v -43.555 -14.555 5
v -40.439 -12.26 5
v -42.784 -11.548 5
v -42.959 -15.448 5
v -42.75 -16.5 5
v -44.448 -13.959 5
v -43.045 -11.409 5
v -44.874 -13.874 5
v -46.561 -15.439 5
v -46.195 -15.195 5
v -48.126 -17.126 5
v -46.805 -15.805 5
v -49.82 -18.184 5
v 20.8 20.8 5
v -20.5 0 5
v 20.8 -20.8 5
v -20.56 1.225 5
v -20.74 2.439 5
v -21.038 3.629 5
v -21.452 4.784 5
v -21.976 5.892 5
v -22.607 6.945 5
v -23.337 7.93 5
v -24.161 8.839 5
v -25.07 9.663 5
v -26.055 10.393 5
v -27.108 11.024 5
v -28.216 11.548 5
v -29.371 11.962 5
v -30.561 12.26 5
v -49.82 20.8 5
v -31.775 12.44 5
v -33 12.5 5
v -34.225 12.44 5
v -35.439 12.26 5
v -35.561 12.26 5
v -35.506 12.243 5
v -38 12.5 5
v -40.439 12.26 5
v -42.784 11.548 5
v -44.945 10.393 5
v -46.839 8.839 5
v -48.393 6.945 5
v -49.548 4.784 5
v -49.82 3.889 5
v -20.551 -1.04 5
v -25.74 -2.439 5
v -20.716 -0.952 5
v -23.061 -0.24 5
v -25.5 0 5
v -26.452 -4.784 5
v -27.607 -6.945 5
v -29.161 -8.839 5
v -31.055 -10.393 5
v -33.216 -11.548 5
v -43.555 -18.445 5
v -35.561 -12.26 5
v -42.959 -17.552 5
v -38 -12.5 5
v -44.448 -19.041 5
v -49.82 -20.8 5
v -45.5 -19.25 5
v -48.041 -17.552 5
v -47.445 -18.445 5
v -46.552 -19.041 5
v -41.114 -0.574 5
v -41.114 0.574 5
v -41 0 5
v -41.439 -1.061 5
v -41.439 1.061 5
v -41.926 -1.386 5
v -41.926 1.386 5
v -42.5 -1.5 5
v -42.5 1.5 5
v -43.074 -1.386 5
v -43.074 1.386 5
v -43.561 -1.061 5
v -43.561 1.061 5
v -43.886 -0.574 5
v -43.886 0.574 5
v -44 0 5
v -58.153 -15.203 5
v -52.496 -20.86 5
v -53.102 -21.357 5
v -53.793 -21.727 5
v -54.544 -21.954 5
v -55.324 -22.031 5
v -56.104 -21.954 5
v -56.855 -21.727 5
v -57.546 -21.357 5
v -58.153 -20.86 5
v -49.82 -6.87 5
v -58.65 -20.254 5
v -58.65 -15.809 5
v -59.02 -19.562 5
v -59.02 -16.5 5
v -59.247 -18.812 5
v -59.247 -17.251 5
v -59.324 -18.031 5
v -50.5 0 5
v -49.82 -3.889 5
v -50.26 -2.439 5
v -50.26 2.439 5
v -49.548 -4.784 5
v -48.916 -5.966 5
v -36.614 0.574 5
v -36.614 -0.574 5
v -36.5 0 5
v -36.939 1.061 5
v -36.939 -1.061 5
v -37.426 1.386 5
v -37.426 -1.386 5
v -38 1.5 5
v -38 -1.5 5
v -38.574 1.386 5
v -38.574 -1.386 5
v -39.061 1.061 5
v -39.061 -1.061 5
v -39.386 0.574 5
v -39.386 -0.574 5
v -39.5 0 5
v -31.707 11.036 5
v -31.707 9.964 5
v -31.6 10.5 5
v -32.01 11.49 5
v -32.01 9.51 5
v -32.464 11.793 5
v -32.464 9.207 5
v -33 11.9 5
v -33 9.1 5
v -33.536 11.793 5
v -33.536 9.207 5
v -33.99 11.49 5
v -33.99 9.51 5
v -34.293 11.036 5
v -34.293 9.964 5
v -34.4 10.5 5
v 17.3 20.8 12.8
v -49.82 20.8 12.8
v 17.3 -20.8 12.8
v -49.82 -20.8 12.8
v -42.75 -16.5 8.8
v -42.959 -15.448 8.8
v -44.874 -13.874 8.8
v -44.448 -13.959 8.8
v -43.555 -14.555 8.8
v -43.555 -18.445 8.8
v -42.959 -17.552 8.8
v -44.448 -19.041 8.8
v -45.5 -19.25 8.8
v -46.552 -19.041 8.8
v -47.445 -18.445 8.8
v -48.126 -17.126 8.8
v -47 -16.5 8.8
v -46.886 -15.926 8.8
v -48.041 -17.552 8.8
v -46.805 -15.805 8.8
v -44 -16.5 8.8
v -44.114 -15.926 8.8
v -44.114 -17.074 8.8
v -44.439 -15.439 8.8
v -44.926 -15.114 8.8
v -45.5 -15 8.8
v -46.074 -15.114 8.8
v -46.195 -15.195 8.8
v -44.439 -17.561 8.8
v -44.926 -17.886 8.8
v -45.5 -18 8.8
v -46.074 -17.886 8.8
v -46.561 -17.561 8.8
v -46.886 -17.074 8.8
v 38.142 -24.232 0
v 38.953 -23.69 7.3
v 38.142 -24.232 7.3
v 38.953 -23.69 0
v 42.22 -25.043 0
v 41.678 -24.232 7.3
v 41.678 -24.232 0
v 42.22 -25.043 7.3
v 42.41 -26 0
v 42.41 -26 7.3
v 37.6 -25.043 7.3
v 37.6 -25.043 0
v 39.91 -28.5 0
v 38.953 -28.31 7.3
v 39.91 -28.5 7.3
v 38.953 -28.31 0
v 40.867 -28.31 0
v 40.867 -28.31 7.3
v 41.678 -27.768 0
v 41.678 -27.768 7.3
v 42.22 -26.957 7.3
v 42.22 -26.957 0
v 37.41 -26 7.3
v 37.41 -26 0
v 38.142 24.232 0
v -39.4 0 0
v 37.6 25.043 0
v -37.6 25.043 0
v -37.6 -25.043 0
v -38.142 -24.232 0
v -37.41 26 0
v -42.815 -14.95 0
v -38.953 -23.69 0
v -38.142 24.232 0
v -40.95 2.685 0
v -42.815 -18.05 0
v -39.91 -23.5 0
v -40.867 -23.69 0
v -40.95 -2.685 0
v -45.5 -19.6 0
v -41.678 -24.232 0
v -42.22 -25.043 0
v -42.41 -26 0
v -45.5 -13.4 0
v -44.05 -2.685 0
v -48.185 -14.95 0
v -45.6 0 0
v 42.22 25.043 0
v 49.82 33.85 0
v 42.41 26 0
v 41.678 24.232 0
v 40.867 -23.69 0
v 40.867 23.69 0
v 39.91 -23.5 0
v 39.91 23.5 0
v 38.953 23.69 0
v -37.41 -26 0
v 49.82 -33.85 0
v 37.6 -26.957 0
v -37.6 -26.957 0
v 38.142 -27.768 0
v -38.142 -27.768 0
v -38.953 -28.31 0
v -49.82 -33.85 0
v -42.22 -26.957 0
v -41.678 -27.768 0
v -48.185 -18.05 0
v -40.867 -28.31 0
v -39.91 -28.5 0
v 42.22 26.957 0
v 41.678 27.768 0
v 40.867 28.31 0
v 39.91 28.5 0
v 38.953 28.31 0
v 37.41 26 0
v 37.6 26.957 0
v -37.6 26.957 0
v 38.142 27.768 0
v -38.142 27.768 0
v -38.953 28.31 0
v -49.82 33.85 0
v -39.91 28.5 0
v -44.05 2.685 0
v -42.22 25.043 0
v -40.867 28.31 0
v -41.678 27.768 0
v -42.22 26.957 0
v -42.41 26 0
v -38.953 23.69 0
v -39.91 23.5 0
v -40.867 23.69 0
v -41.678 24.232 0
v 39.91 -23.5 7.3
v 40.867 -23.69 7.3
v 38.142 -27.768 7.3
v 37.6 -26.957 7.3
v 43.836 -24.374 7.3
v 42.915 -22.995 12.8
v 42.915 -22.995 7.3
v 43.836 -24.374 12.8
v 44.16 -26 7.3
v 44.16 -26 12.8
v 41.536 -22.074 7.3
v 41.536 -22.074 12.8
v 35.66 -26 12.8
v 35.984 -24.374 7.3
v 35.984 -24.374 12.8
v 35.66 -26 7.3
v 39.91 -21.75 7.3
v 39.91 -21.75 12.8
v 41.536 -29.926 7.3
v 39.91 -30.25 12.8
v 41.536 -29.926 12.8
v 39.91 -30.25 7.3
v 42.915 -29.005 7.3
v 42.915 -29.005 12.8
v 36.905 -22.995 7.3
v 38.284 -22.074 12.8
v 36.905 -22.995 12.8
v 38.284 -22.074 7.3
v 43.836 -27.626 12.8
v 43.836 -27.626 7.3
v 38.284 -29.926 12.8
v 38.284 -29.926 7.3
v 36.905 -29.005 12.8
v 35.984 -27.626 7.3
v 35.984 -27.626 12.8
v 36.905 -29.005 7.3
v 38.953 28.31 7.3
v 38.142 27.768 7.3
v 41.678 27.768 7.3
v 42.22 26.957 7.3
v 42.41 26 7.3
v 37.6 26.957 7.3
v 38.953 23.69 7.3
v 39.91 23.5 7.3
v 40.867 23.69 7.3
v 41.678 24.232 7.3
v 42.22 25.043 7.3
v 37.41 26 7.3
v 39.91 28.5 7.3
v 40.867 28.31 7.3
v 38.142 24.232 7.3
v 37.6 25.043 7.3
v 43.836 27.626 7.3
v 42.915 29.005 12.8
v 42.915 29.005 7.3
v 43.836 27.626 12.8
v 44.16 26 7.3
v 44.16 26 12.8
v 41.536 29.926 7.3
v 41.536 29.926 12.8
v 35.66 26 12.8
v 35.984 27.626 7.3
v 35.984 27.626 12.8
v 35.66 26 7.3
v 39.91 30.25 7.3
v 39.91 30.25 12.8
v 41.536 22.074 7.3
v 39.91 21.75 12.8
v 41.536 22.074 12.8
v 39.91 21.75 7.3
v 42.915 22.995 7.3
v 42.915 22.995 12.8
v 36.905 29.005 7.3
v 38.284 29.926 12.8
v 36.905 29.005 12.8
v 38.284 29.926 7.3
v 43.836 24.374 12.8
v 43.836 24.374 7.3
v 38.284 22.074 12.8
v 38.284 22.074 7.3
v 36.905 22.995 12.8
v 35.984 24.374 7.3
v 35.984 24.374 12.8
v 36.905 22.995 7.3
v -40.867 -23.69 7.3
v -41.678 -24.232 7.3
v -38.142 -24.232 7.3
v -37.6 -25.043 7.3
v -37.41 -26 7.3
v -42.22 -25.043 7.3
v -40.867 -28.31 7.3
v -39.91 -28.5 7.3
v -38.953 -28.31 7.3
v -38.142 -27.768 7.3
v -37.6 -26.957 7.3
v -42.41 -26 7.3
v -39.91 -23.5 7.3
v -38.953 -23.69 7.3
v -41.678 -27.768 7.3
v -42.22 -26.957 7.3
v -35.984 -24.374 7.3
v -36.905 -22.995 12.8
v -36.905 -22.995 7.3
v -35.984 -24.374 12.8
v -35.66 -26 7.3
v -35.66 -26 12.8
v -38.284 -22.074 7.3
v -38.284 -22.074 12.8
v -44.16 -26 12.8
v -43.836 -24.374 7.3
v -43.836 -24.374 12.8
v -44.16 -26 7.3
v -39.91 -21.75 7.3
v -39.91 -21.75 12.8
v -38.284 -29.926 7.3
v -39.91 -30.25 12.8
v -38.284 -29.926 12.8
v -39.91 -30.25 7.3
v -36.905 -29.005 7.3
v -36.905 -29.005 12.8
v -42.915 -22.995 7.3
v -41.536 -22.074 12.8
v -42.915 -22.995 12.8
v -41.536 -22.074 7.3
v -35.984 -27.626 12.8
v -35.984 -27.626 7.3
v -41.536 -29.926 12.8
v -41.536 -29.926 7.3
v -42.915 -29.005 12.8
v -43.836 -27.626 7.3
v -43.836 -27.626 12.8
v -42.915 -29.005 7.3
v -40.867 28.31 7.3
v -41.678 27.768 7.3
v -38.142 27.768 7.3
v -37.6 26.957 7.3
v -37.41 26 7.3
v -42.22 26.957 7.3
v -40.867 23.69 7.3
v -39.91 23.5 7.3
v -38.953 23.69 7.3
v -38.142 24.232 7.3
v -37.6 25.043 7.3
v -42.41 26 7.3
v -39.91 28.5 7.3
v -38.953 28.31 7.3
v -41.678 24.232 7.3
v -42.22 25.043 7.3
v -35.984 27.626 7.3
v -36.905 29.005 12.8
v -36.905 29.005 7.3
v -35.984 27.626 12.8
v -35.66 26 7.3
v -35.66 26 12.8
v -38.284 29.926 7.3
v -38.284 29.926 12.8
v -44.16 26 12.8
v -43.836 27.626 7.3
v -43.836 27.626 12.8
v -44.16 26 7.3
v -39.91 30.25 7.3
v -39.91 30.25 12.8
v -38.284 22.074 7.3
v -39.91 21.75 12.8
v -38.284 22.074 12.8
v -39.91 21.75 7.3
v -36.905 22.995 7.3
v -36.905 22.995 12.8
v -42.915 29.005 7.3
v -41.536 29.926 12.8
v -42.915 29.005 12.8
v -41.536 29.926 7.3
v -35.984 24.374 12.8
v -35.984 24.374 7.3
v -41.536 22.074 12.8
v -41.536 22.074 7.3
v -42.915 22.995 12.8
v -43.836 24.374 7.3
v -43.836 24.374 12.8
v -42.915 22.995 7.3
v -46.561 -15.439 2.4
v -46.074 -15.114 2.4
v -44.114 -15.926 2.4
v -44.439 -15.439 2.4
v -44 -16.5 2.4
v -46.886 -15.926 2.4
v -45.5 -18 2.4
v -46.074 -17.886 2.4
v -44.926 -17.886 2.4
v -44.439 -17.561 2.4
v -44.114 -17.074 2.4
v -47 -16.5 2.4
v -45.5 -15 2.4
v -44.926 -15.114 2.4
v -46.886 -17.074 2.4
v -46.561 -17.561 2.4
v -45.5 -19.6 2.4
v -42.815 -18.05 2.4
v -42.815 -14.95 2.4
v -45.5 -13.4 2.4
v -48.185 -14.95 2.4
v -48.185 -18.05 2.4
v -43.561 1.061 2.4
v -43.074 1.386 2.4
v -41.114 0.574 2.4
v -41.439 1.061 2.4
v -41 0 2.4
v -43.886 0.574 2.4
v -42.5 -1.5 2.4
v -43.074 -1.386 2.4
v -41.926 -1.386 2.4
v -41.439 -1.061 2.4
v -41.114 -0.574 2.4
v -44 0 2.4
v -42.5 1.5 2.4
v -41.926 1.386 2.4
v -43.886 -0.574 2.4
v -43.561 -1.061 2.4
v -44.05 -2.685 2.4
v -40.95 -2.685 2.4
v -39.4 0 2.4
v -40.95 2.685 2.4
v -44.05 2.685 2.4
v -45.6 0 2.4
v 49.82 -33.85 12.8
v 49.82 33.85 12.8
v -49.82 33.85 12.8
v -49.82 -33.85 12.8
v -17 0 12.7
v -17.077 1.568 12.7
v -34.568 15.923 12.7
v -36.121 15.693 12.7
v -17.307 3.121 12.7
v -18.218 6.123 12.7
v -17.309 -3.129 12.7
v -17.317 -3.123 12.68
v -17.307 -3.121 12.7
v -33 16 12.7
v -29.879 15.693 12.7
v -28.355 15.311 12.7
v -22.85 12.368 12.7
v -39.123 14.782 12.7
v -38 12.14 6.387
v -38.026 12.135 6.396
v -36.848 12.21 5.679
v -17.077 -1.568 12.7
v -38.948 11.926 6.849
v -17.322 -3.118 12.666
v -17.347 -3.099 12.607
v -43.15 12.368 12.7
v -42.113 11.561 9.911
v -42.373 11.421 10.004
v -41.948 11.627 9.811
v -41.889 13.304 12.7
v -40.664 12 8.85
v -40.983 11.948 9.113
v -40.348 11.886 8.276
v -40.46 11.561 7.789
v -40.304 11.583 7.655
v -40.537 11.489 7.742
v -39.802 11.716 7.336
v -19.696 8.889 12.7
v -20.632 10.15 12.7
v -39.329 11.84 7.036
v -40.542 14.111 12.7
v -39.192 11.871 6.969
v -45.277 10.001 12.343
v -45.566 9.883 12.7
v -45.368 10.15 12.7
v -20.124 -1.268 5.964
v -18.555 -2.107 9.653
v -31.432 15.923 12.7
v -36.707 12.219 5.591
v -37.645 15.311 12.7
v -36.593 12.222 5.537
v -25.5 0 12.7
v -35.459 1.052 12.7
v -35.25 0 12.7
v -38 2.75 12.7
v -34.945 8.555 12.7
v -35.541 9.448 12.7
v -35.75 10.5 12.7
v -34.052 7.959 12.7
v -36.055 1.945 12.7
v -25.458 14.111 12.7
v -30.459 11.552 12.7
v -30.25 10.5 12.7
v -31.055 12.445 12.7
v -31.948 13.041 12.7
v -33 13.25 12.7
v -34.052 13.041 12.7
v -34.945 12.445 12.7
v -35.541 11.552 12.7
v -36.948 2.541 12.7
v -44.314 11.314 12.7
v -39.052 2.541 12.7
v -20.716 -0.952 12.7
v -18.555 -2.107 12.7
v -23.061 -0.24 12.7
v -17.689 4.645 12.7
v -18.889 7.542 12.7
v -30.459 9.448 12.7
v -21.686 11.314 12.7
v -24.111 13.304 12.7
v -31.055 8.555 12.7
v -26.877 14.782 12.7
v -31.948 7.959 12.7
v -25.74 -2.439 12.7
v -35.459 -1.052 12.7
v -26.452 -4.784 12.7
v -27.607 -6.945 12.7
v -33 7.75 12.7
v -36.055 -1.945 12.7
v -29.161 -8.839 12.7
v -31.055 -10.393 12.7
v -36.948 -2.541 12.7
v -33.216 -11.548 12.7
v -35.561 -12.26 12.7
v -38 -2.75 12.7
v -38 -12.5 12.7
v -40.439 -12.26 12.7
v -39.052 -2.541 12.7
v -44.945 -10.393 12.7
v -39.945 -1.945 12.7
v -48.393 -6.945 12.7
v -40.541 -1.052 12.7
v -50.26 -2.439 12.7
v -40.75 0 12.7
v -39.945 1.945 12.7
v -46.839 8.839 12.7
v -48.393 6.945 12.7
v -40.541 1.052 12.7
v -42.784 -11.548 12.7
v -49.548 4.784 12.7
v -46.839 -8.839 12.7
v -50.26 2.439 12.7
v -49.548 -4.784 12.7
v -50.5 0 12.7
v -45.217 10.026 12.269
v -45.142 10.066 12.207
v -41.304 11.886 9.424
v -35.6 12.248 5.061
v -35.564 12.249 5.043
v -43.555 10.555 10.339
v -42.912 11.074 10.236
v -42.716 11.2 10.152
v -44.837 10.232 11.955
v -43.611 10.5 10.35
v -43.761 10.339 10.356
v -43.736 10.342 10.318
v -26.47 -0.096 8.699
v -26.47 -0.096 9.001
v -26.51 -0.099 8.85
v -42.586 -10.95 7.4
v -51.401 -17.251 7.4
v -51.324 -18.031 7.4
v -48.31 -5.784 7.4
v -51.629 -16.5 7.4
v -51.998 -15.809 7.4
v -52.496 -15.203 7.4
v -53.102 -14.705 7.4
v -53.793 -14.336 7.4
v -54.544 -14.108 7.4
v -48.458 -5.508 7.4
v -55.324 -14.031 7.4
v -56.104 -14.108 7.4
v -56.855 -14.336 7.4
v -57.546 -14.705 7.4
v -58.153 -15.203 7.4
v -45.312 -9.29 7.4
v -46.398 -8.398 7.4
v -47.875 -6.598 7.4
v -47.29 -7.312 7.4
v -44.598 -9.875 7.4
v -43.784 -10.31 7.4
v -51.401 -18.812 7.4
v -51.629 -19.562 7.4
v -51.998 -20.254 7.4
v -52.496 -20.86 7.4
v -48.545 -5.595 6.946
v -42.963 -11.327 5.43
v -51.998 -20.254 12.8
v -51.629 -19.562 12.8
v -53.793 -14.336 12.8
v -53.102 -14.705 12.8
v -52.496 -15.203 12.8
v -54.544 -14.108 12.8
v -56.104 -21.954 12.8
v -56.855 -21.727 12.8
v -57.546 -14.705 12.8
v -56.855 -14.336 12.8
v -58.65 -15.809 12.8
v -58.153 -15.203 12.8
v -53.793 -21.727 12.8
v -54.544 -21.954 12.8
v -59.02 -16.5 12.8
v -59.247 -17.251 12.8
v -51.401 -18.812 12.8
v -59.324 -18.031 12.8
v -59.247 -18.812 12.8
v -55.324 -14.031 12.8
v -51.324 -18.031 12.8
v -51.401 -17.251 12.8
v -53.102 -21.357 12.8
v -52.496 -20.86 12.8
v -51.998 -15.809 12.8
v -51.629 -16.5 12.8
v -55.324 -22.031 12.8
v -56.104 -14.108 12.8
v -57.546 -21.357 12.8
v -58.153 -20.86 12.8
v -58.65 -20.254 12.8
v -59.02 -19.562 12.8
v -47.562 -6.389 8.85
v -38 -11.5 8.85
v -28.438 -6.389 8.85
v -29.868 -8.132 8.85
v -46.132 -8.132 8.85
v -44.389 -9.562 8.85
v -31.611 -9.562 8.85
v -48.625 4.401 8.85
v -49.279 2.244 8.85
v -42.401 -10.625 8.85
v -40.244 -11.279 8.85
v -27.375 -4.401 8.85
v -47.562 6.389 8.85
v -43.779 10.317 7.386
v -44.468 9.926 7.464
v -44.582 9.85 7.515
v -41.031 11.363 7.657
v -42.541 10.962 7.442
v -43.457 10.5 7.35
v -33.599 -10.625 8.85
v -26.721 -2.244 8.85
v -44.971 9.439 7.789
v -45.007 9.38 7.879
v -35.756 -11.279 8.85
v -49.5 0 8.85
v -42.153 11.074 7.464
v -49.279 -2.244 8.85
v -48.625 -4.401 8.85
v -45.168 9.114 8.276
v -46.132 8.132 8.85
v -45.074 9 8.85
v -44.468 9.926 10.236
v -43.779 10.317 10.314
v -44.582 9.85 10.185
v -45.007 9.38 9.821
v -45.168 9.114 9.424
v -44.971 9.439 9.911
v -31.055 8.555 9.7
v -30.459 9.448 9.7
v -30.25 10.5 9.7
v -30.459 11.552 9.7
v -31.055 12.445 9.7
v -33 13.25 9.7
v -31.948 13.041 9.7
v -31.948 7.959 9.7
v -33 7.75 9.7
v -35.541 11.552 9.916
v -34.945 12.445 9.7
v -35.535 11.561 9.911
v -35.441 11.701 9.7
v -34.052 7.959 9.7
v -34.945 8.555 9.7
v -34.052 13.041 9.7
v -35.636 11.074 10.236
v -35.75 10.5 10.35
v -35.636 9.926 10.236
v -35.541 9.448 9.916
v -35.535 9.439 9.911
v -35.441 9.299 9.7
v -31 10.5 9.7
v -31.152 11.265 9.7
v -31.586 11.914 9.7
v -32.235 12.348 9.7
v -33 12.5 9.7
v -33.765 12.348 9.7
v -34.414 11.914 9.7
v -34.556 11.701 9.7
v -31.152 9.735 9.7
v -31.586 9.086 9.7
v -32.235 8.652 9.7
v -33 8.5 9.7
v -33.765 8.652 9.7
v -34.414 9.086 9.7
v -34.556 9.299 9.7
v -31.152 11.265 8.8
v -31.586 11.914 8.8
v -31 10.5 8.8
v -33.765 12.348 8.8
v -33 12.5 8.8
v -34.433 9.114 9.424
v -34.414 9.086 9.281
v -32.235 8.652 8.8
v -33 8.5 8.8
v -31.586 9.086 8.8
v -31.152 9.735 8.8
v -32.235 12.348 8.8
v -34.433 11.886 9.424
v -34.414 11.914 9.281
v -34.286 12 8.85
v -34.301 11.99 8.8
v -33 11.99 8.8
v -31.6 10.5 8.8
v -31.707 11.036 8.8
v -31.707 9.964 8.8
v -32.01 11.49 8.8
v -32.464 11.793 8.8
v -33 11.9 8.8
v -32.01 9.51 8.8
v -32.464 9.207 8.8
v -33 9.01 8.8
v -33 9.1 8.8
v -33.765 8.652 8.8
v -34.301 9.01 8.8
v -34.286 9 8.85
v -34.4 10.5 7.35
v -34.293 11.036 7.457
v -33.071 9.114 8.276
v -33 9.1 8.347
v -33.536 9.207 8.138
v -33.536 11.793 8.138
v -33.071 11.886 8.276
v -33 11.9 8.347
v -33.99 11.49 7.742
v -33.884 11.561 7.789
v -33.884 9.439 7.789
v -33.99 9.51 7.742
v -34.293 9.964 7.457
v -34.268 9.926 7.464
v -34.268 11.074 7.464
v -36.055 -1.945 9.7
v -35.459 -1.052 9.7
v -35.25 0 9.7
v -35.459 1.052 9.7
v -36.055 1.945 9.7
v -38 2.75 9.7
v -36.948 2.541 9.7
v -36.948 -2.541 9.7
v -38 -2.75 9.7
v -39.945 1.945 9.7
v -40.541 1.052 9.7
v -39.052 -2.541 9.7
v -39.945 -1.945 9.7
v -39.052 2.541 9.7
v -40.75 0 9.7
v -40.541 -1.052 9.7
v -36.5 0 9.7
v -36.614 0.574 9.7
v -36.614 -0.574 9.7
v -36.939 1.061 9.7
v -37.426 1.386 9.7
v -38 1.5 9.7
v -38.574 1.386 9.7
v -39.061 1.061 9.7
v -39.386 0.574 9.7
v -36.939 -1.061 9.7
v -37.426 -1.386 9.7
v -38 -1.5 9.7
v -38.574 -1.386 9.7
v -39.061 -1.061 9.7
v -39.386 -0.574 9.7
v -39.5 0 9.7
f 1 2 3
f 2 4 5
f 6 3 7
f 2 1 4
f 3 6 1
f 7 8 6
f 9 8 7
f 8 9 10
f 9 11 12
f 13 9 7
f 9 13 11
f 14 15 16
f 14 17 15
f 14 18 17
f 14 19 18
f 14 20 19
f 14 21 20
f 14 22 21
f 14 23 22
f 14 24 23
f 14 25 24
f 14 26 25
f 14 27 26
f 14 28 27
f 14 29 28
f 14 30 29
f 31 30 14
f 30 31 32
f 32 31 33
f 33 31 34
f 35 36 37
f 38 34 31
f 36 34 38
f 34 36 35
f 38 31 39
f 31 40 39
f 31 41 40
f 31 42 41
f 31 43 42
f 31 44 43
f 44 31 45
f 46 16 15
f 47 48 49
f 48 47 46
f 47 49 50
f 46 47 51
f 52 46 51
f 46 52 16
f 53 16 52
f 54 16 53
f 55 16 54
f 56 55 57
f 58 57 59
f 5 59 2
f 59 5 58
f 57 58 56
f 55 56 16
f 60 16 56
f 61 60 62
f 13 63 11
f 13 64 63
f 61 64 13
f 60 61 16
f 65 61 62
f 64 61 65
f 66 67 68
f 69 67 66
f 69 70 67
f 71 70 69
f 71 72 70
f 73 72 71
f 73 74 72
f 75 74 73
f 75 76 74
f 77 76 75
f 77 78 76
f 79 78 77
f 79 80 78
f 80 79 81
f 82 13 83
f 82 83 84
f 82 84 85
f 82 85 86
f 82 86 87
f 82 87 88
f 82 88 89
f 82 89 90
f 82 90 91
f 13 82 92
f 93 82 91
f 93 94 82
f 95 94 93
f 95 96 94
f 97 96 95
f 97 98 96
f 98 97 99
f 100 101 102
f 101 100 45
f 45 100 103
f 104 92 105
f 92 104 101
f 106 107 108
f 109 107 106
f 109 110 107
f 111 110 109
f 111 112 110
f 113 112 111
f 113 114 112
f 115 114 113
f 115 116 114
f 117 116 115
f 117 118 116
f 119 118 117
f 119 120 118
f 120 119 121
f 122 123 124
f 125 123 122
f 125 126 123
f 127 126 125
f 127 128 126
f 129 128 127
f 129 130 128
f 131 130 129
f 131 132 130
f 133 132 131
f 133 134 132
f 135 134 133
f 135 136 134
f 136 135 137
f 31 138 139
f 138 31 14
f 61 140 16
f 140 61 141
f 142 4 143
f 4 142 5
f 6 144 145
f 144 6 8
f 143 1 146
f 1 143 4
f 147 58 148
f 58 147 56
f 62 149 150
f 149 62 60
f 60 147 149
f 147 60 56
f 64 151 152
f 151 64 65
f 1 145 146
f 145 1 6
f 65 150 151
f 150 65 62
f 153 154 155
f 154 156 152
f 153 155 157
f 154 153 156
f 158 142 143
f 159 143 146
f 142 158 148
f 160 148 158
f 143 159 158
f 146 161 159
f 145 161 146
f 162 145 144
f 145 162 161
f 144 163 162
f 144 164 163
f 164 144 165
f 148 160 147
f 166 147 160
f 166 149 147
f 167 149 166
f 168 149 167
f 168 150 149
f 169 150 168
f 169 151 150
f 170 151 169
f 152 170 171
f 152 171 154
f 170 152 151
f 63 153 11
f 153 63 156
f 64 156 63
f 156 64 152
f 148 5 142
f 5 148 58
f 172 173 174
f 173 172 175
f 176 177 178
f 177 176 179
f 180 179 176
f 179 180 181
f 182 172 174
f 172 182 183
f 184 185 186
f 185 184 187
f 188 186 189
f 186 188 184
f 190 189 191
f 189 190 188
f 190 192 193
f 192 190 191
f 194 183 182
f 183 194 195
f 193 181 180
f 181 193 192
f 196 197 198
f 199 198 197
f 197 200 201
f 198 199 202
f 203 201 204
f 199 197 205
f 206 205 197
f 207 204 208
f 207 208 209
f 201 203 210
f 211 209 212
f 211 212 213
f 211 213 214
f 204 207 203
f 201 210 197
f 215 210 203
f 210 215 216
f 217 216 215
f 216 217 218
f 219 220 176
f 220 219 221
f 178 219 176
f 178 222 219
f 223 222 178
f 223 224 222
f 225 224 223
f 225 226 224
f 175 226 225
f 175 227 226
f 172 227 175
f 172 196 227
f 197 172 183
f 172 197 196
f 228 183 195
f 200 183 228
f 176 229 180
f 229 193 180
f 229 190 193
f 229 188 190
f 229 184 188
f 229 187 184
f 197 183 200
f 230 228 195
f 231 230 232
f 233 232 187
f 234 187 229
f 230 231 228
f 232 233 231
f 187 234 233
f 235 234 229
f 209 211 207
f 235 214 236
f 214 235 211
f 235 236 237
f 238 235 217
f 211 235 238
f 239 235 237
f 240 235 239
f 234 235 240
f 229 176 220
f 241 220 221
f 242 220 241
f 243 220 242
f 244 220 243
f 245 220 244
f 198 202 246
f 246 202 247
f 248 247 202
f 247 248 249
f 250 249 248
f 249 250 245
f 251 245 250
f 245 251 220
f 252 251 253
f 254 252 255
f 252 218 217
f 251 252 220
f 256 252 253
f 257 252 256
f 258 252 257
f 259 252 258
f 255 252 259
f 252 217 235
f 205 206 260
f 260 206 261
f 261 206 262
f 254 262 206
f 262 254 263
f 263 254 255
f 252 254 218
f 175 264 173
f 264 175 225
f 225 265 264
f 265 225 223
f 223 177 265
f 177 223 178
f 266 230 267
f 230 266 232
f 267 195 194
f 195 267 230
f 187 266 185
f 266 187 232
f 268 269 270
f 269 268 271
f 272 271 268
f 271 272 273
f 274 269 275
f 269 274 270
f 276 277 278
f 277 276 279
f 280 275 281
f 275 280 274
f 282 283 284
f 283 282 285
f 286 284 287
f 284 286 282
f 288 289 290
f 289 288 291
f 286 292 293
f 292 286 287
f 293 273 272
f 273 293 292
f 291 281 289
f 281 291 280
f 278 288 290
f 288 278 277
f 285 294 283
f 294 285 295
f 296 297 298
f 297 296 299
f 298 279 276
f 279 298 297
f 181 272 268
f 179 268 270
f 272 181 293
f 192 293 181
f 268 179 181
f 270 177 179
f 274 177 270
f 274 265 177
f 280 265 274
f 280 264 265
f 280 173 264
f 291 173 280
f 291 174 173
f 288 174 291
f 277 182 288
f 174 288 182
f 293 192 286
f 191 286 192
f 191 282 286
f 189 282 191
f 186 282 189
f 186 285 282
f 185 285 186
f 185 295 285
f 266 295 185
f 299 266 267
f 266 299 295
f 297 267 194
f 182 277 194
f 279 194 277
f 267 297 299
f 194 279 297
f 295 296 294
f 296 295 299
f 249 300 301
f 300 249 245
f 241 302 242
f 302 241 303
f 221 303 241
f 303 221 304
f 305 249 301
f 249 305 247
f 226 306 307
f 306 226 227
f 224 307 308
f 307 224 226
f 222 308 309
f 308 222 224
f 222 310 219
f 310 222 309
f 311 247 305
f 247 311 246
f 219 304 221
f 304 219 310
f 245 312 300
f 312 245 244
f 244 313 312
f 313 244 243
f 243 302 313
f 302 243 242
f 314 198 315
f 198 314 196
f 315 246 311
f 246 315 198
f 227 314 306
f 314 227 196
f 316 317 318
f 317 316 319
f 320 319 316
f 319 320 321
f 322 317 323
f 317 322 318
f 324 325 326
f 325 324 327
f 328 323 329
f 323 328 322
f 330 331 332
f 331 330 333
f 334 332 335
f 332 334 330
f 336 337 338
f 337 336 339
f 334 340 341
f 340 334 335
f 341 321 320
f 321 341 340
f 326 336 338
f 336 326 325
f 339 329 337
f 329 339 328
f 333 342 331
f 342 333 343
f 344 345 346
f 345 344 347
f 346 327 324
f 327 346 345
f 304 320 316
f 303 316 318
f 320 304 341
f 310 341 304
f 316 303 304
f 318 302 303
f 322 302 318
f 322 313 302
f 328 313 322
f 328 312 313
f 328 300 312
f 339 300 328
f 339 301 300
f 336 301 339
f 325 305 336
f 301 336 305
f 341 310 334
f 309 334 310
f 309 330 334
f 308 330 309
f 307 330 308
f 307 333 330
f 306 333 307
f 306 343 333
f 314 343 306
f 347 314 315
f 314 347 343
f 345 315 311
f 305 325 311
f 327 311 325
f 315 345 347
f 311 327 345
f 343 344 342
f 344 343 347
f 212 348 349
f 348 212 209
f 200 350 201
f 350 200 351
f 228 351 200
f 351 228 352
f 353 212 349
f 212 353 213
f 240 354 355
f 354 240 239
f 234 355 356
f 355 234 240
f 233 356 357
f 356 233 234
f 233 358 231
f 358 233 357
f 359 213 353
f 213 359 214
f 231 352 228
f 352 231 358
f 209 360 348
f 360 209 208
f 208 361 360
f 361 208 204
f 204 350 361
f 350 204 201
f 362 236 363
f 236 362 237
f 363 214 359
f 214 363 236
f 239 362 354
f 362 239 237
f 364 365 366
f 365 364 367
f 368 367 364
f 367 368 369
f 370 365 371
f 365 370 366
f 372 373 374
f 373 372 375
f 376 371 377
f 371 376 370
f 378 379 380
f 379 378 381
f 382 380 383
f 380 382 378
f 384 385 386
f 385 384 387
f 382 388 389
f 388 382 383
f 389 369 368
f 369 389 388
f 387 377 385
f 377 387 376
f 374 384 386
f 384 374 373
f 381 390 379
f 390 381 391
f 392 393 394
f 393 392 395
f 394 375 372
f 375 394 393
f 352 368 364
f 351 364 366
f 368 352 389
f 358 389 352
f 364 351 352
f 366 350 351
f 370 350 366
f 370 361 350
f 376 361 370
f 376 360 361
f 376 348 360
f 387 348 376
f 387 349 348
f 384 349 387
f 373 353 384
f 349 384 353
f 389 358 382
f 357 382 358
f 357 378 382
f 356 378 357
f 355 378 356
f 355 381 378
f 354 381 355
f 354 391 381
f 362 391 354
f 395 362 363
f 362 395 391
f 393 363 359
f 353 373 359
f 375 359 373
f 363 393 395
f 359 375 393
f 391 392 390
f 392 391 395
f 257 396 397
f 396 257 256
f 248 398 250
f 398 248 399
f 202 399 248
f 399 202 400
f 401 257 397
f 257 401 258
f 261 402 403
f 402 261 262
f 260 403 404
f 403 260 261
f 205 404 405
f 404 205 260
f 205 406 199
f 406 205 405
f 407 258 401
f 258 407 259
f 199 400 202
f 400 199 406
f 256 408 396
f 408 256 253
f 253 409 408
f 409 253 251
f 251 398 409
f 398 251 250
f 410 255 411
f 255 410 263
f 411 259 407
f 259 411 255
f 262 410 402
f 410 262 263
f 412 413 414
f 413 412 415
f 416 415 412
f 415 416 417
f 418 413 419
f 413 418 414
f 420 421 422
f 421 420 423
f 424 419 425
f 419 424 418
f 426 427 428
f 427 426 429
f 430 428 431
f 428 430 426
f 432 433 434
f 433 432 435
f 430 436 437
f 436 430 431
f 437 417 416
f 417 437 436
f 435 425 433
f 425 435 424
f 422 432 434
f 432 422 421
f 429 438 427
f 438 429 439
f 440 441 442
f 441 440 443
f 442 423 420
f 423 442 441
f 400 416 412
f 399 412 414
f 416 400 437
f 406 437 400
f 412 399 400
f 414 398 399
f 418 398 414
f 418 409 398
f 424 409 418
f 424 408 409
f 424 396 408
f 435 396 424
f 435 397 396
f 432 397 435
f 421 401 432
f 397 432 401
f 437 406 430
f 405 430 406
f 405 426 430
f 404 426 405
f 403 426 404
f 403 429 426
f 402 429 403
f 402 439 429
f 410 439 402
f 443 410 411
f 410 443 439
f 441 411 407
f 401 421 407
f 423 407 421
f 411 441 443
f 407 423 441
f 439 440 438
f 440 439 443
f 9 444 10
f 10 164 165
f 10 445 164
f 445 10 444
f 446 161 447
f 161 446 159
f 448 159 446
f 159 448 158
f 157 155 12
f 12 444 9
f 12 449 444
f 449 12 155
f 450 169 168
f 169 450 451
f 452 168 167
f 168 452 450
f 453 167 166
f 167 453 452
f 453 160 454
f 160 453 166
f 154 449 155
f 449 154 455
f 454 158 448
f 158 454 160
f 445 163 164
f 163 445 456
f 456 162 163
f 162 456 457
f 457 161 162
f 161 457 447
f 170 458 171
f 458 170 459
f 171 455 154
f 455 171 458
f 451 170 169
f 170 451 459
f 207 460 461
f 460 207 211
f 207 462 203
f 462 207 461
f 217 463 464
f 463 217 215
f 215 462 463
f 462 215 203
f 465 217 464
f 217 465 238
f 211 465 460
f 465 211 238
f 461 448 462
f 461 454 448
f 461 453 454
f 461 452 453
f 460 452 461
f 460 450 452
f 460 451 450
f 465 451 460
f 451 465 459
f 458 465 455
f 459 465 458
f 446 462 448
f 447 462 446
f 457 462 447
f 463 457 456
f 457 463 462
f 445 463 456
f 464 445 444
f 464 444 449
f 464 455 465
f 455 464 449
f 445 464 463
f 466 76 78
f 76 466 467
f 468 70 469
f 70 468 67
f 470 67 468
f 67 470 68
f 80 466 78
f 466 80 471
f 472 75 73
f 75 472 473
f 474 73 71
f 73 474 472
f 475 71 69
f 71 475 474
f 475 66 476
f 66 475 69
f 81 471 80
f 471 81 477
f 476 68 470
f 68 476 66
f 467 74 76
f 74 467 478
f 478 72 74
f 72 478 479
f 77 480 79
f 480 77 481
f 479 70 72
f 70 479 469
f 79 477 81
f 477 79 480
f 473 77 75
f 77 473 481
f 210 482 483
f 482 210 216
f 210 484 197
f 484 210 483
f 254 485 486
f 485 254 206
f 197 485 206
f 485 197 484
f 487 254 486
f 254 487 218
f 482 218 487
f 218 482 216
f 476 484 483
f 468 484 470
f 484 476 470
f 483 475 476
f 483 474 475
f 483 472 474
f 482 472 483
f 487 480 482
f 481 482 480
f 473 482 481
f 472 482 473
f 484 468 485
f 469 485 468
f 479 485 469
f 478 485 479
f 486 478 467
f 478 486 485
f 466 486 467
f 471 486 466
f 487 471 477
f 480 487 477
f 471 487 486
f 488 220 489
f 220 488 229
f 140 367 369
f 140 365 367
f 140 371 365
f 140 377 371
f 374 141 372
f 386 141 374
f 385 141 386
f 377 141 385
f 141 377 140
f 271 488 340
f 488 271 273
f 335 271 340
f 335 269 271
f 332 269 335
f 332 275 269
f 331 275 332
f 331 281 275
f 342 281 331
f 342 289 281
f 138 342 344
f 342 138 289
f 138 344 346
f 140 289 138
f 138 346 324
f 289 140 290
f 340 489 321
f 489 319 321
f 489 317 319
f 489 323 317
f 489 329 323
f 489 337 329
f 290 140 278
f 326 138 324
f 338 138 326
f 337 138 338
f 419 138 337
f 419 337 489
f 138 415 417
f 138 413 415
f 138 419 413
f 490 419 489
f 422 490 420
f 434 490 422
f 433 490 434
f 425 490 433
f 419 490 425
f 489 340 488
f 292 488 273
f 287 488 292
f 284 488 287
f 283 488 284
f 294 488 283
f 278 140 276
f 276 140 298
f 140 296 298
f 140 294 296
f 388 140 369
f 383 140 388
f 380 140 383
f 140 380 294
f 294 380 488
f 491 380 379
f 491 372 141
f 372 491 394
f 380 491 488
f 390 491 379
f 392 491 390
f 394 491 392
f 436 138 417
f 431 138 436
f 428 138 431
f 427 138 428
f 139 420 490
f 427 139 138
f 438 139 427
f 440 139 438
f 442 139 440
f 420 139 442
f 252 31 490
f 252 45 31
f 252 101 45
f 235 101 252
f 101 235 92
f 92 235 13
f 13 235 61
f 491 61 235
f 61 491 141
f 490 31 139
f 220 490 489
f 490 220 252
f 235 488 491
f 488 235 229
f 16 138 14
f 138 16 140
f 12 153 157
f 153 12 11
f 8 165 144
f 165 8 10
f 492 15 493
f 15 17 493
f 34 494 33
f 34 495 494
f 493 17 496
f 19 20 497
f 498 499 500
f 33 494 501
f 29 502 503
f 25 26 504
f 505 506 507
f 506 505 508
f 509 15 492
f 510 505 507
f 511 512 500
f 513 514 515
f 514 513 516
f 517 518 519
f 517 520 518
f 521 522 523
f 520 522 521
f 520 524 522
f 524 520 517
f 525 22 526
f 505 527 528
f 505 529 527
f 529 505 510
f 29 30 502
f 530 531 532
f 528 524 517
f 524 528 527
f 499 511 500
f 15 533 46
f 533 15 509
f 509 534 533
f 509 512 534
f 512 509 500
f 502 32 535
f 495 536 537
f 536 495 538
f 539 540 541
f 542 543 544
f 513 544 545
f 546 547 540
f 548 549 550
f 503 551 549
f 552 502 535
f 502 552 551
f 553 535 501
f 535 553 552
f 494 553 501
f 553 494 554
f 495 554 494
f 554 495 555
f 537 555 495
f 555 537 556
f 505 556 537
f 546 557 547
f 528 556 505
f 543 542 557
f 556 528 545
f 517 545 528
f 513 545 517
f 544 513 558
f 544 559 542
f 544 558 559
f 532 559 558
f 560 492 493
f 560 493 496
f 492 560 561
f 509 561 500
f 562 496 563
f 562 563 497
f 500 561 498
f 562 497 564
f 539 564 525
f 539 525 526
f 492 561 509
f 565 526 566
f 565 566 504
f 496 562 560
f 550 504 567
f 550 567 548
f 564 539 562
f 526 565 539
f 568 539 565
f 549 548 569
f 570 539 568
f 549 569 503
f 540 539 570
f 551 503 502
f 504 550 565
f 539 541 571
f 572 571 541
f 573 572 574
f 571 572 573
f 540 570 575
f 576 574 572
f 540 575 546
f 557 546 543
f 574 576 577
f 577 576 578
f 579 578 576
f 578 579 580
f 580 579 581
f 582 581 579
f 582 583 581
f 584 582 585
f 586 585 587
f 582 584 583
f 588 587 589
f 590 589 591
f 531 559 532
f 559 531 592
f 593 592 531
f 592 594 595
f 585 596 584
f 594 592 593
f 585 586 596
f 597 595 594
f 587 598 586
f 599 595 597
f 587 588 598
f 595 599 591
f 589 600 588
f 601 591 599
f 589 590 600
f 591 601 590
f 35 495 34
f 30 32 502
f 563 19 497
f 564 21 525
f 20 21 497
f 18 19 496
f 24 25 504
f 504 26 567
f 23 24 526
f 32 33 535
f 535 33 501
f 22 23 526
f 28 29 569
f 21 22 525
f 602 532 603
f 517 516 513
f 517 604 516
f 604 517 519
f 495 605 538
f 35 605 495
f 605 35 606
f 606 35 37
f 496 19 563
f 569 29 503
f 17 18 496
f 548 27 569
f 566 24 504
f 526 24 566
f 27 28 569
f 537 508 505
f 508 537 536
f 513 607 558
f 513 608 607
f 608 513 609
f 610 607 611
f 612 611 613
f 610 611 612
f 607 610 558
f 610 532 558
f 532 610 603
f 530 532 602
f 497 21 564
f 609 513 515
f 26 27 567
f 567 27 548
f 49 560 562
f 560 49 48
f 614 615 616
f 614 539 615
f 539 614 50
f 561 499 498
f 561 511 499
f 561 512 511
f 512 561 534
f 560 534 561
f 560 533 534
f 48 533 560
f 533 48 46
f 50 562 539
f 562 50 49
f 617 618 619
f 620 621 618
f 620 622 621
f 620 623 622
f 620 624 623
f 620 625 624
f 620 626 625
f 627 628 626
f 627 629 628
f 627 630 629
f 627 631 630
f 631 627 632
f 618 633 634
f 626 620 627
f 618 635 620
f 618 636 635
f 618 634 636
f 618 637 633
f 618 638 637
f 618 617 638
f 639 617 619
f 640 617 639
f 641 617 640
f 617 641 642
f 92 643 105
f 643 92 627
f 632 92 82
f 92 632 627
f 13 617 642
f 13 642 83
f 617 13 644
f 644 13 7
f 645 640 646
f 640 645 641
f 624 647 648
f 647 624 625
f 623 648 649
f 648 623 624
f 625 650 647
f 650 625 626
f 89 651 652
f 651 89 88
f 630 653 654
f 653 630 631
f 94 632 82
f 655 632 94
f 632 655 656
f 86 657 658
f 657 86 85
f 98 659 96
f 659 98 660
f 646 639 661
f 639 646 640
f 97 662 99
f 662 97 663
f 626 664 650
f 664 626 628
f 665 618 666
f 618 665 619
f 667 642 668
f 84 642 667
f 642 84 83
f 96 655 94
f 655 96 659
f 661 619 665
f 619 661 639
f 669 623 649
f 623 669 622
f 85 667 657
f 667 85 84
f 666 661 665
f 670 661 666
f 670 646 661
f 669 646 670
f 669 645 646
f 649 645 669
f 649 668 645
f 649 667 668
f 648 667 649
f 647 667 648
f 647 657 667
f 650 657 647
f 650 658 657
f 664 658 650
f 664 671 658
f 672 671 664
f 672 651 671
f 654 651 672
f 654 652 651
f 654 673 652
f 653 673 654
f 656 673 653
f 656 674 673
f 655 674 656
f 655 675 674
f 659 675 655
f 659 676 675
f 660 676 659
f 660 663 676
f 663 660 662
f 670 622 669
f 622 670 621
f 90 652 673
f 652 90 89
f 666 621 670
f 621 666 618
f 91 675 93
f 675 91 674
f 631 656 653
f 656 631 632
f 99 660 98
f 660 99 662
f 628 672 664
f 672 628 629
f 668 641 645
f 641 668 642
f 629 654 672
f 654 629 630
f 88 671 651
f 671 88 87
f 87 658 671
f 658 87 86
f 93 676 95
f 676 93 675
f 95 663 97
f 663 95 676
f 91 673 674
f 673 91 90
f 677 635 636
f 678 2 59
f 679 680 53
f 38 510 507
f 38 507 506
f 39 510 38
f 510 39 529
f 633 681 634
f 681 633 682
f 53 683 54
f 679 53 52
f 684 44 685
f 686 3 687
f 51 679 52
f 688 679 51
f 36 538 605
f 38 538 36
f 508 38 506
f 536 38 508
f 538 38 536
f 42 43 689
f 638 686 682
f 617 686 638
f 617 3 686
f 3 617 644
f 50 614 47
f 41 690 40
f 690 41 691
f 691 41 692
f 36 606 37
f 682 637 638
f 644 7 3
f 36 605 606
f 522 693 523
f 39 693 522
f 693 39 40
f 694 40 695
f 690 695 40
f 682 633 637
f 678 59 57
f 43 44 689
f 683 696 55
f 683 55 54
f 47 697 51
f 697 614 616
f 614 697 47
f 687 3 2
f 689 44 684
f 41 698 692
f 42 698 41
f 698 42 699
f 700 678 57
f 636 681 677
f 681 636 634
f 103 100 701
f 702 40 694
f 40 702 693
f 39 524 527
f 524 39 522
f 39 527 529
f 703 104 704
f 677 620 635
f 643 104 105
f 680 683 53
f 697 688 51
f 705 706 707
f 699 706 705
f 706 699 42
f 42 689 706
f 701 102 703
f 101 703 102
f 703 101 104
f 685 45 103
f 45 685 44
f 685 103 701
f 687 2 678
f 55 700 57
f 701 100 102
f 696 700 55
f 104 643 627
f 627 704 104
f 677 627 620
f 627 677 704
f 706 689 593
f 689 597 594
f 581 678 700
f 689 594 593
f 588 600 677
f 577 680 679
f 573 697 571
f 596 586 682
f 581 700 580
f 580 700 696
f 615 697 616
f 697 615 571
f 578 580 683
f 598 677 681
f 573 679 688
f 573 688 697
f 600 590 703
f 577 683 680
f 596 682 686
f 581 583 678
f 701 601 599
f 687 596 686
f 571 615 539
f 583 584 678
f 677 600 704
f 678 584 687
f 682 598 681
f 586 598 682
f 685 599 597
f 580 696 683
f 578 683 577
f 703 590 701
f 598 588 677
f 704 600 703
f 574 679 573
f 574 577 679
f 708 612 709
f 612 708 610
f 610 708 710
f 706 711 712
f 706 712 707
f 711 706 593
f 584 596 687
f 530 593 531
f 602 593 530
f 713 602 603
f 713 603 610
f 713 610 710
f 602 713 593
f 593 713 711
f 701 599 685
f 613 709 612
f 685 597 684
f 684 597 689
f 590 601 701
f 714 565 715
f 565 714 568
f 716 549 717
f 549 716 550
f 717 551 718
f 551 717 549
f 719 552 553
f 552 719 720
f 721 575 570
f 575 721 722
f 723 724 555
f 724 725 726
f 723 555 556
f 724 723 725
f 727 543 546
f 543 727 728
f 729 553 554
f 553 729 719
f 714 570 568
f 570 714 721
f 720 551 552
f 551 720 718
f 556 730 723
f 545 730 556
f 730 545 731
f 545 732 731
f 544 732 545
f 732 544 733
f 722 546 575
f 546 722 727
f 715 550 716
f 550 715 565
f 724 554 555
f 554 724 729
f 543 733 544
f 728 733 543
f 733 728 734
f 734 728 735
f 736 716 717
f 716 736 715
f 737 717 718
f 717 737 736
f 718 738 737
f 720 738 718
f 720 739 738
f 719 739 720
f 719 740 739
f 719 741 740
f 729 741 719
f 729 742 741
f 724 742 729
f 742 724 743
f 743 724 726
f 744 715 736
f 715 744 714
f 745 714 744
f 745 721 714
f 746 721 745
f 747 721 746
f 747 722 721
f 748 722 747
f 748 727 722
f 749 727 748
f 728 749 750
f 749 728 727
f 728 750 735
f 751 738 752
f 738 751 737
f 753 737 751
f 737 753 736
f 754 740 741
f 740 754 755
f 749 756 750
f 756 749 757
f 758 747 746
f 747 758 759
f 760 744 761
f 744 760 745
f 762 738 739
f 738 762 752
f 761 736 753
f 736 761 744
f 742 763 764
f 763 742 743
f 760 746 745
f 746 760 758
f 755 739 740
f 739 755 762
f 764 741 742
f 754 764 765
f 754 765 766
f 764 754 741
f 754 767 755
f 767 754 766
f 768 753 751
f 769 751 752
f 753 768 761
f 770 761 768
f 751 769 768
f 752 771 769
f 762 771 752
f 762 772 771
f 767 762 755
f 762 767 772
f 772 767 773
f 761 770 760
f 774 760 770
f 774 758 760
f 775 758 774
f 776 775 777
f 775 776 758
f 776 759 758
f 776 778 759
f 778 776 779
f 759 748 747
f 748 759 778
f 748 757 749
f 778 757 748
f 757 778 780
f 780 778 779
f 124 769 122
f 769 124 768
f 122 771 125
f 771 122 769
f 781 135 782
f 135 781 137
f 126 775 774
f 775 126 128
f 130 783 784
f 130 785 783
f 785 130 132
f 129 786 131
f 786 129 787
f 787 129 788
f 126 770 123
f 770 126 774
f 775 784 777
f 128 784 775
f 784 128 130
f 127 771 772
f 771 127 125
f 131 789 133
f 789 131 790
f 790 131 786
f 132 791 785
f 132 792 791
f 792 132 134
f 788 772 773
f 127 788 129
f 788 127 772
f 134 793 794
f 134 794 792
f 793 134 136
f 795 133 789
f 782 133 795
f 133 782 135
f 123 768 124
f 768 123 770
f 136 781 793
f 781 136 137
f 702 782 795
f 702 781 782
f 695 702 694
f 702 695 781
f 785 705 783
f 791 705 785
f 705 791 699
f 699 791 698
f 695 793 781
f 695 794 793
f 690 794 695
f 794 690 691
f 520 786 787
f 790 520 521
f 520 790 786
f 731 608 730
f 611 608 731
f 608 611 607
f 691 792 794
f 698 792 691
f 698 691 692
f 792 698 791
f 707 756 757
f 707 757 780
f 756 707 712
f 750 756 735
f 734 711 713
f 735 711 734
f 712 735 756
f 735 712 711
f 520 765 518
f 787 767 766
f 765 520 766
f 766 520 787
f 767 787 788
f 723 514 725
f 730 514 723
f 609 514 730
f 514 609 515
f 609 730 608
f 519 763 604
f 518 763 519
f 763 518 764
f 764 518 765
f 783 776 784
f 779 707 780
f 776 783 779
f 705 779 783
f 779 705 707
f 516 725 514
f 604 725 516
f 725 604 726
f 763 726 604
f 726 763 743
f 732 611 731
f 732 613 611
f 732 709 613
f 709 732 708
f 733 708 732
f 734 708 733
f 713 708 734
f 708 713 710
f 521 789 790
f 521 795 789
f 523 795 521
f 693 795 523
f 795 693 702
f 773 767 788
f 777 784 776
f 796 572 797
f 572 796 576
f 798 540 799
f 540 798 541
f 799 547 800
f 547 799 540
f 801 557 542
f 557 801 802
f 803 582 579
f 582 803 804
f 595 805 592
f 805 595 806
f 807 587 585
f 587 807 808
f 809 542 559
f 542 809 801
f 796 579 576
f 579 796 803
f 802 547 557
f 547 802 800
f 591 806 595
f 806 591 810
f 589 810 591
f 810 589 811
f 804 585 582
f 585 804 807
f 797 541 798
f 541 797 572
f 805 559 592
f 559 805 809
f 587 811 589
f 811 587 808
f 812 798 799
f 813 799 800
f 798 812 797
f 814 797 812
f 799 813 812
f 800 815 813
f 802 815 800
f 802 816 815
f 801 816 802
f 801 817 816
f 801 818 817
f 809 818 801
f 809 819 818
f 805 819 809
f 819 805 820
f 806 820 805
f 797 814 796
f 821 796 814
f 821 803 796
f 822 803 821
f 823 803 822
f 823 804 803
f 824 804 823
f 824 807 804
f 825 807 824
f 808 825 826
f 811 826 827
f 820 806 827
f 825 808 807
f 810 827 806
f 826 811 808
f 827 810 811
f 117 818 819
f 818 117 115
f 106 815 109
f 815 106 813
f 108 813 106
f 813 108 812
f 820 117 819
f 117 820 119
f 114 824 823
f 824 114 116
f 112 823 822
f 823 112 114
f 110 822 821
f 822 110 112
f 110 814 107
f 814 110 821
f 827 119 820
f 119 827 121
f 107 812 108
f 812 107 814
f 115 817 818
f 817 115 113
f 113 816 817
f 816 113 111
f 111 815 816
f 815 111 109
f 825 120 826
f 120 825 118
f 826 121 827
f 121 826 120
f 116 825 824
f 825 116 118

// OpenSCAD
b = 67.7;
l = 67.7;
h = 6.3;
t = 7.8;
x = 41.4 + 0.2;
y = 41.4 + 0.2;
dx = 13.15;
dy = 13.15;
vs = (x-34.6)/2;
vv = (y-34.5)/2;
dicke = 5;
profilabstand = 60;
profilbreite = 19.82;
spannerD = 25;
spannerOffset = 5;
M3SchraubenkopfH = 3;
M3SchraubenkopfD = 5.5;
M3Schraube = 3;
M3MutterH = 2.4;
M3MutterD = 6.2;
M5SchraubenkopfH = 5.5;
M5SchraubenkopfD = 8.5;
M5Schraube = 5;

module Platte() {
    color("SteelBlue") {
        polyhedron(points=[
            [x/2, y/2, 0],
            [x/2, -y/2, 0],
            [-x/2, y/2, 0],
            [-x/2, -y/2, 0],
            [x/2-vs, y/2, t],
            [x/2-vs, -y/2, t],
            [-x/2+vs, y/2, t],
            [-x/2+vs, -y/2, t]
            ], faces=[
            [0, 2, 3, 1],
            [0, 1, 5, 4],
            [2, 6, 7, 3],
            [1, 3, 7, 5],
            [2, 0, 4, 6],
            [4, 5, 7, 6]
            ]);
    }
}

module Rahmen() {
    difference() {
        translate([-max(b, profilabstand+2*profilbreite)/2, -l/2, 0]) {
            cube([max(b, profilabstand+2*profilbreite), l, t+dicke]);
        }
        translate([0, 0, dicke]) {
            Platte();
        }
        difference() {
            translate([-max(b, profilabstand+2*profilbreite)/2-0.1, -y/2, dicke]) {
                cube([67, y, t+0.1]);
            }
            translate([-3*spannerD/2-spannerOffset-3, -spannerD/2-4, dicke]) {
                cylinder(h=t/2-0.1, d=M3SchraubenkopfD, $fn=16);
            }
        }
        for(i=[profilabstand/2+profilbreite/2, -profilabstand/2-profilbreite/2]) {
            for(j=[-1,1]) {
                translate([i, j*26, 0]) {
                    cylinder(h=t+dicke+0.1, d=M5Schraube, $fn=16);
                    translate([0, 0, t+dicke-M5SchraubenkopfH]) {
                        cylinder(h=M5SchraubenkopfH+0.1, d=M5SchraubenkopfD, $fn=16);
                    }
                }
            }
        }
        translate([-3*spannerD/2-spannerOffset, 0, 0]) {
            cylinder(h=t+dicke+0.1, d=M3Schraube, $fn=16);
            cylinder(h=M3MutterH, d=M3MutterD, $fn=6);
            translate([-3, -spannerD/2-4, 0]) {
                cylinder(h=t+dicke+0.1, d=M3Schraube, $fn=16);
                rotate([0, 0, 30]) cylinder(h=M3MutterH, d=M3MutterD, $fn=6);
            }
        }
        translate([-3*spannerD/2-spannerOffset-9, -spannerD/2-8, dicke]) {
            rotate([0, 0, 45]) {
                cube([10, 10, 10]);
            }
        }
    }
}

module Spanner() {
    difference() {
        union() {
            difference() {
                translate([spannerOffset, 0, 0]) {
                    cylinder(h=t-0.1, d1=spannerD, d2=spannerD+2*vs, $fn=64);
                }
                translate([spannerD/2, -spannerD/2, 0]) {
                    cylinder(h=t, d=spannerD, $fn=32);
                }
                translate([0, -spannerD/2, 0]) {
                    cylinder(h=t, d=spannerD, $fn=32);
                }
            }
            cylinder(h=t/2-0.05, d1=spannerD, d2=spannerD-2, $fn=32);
            translate([0, 0, t/2-0.05]) {
                cylinder(h=t/2-0.05, d1=spannerD-2, d2=spannerD, $fn=32);
            }
            rotate([0, 0, 45]) {
                translate([-25, -4.5, 0]) {
                    cube([25, 8, t/2-1.5]);
                    translate([0, 4, 0]) {
                        cylinder(h=t, d=8, $fn=32);
                    }
                }
            }
        }
        translate([0, 0, t-0.1-M3SchraubenkopfH]) {
            cylinder(h=M3SchraubenkopfH+0.1, d=M3SchraubenkopfD, $fn=16);
        }
        cylinder(h=t, d=M3Schraube, $fn=16);
        translate([5, spannerD/2-2, 0]) {
            translate([0, 0, t-0.1-M3SchraubenkopfH]) {
                cylinder(h=M3SchraubenkopfH+0.1, d=M3SchraubenkopfD, $fn=16);
            }
            translate([0, 0, t/2-0.1]) {
                cylinder(h=t/2+0.2, d=4, $fn=16);
            }
            cylinder(h=t, d=M3Schraube-0.2, $fn=16);
            translate([0, 0, t/2-0.05]) {
                rotate([90, 0, -90]) {
                    cylinder(h=15, d=3, $fn=16);
                }
            }   
        }
    }
}

Rahmen();
//translate([0, 0, dicke]) Platte();
translate([-3*spannerD/2-0.5, 0, dicke]) color("Red") Spanner();
//Spanner();
